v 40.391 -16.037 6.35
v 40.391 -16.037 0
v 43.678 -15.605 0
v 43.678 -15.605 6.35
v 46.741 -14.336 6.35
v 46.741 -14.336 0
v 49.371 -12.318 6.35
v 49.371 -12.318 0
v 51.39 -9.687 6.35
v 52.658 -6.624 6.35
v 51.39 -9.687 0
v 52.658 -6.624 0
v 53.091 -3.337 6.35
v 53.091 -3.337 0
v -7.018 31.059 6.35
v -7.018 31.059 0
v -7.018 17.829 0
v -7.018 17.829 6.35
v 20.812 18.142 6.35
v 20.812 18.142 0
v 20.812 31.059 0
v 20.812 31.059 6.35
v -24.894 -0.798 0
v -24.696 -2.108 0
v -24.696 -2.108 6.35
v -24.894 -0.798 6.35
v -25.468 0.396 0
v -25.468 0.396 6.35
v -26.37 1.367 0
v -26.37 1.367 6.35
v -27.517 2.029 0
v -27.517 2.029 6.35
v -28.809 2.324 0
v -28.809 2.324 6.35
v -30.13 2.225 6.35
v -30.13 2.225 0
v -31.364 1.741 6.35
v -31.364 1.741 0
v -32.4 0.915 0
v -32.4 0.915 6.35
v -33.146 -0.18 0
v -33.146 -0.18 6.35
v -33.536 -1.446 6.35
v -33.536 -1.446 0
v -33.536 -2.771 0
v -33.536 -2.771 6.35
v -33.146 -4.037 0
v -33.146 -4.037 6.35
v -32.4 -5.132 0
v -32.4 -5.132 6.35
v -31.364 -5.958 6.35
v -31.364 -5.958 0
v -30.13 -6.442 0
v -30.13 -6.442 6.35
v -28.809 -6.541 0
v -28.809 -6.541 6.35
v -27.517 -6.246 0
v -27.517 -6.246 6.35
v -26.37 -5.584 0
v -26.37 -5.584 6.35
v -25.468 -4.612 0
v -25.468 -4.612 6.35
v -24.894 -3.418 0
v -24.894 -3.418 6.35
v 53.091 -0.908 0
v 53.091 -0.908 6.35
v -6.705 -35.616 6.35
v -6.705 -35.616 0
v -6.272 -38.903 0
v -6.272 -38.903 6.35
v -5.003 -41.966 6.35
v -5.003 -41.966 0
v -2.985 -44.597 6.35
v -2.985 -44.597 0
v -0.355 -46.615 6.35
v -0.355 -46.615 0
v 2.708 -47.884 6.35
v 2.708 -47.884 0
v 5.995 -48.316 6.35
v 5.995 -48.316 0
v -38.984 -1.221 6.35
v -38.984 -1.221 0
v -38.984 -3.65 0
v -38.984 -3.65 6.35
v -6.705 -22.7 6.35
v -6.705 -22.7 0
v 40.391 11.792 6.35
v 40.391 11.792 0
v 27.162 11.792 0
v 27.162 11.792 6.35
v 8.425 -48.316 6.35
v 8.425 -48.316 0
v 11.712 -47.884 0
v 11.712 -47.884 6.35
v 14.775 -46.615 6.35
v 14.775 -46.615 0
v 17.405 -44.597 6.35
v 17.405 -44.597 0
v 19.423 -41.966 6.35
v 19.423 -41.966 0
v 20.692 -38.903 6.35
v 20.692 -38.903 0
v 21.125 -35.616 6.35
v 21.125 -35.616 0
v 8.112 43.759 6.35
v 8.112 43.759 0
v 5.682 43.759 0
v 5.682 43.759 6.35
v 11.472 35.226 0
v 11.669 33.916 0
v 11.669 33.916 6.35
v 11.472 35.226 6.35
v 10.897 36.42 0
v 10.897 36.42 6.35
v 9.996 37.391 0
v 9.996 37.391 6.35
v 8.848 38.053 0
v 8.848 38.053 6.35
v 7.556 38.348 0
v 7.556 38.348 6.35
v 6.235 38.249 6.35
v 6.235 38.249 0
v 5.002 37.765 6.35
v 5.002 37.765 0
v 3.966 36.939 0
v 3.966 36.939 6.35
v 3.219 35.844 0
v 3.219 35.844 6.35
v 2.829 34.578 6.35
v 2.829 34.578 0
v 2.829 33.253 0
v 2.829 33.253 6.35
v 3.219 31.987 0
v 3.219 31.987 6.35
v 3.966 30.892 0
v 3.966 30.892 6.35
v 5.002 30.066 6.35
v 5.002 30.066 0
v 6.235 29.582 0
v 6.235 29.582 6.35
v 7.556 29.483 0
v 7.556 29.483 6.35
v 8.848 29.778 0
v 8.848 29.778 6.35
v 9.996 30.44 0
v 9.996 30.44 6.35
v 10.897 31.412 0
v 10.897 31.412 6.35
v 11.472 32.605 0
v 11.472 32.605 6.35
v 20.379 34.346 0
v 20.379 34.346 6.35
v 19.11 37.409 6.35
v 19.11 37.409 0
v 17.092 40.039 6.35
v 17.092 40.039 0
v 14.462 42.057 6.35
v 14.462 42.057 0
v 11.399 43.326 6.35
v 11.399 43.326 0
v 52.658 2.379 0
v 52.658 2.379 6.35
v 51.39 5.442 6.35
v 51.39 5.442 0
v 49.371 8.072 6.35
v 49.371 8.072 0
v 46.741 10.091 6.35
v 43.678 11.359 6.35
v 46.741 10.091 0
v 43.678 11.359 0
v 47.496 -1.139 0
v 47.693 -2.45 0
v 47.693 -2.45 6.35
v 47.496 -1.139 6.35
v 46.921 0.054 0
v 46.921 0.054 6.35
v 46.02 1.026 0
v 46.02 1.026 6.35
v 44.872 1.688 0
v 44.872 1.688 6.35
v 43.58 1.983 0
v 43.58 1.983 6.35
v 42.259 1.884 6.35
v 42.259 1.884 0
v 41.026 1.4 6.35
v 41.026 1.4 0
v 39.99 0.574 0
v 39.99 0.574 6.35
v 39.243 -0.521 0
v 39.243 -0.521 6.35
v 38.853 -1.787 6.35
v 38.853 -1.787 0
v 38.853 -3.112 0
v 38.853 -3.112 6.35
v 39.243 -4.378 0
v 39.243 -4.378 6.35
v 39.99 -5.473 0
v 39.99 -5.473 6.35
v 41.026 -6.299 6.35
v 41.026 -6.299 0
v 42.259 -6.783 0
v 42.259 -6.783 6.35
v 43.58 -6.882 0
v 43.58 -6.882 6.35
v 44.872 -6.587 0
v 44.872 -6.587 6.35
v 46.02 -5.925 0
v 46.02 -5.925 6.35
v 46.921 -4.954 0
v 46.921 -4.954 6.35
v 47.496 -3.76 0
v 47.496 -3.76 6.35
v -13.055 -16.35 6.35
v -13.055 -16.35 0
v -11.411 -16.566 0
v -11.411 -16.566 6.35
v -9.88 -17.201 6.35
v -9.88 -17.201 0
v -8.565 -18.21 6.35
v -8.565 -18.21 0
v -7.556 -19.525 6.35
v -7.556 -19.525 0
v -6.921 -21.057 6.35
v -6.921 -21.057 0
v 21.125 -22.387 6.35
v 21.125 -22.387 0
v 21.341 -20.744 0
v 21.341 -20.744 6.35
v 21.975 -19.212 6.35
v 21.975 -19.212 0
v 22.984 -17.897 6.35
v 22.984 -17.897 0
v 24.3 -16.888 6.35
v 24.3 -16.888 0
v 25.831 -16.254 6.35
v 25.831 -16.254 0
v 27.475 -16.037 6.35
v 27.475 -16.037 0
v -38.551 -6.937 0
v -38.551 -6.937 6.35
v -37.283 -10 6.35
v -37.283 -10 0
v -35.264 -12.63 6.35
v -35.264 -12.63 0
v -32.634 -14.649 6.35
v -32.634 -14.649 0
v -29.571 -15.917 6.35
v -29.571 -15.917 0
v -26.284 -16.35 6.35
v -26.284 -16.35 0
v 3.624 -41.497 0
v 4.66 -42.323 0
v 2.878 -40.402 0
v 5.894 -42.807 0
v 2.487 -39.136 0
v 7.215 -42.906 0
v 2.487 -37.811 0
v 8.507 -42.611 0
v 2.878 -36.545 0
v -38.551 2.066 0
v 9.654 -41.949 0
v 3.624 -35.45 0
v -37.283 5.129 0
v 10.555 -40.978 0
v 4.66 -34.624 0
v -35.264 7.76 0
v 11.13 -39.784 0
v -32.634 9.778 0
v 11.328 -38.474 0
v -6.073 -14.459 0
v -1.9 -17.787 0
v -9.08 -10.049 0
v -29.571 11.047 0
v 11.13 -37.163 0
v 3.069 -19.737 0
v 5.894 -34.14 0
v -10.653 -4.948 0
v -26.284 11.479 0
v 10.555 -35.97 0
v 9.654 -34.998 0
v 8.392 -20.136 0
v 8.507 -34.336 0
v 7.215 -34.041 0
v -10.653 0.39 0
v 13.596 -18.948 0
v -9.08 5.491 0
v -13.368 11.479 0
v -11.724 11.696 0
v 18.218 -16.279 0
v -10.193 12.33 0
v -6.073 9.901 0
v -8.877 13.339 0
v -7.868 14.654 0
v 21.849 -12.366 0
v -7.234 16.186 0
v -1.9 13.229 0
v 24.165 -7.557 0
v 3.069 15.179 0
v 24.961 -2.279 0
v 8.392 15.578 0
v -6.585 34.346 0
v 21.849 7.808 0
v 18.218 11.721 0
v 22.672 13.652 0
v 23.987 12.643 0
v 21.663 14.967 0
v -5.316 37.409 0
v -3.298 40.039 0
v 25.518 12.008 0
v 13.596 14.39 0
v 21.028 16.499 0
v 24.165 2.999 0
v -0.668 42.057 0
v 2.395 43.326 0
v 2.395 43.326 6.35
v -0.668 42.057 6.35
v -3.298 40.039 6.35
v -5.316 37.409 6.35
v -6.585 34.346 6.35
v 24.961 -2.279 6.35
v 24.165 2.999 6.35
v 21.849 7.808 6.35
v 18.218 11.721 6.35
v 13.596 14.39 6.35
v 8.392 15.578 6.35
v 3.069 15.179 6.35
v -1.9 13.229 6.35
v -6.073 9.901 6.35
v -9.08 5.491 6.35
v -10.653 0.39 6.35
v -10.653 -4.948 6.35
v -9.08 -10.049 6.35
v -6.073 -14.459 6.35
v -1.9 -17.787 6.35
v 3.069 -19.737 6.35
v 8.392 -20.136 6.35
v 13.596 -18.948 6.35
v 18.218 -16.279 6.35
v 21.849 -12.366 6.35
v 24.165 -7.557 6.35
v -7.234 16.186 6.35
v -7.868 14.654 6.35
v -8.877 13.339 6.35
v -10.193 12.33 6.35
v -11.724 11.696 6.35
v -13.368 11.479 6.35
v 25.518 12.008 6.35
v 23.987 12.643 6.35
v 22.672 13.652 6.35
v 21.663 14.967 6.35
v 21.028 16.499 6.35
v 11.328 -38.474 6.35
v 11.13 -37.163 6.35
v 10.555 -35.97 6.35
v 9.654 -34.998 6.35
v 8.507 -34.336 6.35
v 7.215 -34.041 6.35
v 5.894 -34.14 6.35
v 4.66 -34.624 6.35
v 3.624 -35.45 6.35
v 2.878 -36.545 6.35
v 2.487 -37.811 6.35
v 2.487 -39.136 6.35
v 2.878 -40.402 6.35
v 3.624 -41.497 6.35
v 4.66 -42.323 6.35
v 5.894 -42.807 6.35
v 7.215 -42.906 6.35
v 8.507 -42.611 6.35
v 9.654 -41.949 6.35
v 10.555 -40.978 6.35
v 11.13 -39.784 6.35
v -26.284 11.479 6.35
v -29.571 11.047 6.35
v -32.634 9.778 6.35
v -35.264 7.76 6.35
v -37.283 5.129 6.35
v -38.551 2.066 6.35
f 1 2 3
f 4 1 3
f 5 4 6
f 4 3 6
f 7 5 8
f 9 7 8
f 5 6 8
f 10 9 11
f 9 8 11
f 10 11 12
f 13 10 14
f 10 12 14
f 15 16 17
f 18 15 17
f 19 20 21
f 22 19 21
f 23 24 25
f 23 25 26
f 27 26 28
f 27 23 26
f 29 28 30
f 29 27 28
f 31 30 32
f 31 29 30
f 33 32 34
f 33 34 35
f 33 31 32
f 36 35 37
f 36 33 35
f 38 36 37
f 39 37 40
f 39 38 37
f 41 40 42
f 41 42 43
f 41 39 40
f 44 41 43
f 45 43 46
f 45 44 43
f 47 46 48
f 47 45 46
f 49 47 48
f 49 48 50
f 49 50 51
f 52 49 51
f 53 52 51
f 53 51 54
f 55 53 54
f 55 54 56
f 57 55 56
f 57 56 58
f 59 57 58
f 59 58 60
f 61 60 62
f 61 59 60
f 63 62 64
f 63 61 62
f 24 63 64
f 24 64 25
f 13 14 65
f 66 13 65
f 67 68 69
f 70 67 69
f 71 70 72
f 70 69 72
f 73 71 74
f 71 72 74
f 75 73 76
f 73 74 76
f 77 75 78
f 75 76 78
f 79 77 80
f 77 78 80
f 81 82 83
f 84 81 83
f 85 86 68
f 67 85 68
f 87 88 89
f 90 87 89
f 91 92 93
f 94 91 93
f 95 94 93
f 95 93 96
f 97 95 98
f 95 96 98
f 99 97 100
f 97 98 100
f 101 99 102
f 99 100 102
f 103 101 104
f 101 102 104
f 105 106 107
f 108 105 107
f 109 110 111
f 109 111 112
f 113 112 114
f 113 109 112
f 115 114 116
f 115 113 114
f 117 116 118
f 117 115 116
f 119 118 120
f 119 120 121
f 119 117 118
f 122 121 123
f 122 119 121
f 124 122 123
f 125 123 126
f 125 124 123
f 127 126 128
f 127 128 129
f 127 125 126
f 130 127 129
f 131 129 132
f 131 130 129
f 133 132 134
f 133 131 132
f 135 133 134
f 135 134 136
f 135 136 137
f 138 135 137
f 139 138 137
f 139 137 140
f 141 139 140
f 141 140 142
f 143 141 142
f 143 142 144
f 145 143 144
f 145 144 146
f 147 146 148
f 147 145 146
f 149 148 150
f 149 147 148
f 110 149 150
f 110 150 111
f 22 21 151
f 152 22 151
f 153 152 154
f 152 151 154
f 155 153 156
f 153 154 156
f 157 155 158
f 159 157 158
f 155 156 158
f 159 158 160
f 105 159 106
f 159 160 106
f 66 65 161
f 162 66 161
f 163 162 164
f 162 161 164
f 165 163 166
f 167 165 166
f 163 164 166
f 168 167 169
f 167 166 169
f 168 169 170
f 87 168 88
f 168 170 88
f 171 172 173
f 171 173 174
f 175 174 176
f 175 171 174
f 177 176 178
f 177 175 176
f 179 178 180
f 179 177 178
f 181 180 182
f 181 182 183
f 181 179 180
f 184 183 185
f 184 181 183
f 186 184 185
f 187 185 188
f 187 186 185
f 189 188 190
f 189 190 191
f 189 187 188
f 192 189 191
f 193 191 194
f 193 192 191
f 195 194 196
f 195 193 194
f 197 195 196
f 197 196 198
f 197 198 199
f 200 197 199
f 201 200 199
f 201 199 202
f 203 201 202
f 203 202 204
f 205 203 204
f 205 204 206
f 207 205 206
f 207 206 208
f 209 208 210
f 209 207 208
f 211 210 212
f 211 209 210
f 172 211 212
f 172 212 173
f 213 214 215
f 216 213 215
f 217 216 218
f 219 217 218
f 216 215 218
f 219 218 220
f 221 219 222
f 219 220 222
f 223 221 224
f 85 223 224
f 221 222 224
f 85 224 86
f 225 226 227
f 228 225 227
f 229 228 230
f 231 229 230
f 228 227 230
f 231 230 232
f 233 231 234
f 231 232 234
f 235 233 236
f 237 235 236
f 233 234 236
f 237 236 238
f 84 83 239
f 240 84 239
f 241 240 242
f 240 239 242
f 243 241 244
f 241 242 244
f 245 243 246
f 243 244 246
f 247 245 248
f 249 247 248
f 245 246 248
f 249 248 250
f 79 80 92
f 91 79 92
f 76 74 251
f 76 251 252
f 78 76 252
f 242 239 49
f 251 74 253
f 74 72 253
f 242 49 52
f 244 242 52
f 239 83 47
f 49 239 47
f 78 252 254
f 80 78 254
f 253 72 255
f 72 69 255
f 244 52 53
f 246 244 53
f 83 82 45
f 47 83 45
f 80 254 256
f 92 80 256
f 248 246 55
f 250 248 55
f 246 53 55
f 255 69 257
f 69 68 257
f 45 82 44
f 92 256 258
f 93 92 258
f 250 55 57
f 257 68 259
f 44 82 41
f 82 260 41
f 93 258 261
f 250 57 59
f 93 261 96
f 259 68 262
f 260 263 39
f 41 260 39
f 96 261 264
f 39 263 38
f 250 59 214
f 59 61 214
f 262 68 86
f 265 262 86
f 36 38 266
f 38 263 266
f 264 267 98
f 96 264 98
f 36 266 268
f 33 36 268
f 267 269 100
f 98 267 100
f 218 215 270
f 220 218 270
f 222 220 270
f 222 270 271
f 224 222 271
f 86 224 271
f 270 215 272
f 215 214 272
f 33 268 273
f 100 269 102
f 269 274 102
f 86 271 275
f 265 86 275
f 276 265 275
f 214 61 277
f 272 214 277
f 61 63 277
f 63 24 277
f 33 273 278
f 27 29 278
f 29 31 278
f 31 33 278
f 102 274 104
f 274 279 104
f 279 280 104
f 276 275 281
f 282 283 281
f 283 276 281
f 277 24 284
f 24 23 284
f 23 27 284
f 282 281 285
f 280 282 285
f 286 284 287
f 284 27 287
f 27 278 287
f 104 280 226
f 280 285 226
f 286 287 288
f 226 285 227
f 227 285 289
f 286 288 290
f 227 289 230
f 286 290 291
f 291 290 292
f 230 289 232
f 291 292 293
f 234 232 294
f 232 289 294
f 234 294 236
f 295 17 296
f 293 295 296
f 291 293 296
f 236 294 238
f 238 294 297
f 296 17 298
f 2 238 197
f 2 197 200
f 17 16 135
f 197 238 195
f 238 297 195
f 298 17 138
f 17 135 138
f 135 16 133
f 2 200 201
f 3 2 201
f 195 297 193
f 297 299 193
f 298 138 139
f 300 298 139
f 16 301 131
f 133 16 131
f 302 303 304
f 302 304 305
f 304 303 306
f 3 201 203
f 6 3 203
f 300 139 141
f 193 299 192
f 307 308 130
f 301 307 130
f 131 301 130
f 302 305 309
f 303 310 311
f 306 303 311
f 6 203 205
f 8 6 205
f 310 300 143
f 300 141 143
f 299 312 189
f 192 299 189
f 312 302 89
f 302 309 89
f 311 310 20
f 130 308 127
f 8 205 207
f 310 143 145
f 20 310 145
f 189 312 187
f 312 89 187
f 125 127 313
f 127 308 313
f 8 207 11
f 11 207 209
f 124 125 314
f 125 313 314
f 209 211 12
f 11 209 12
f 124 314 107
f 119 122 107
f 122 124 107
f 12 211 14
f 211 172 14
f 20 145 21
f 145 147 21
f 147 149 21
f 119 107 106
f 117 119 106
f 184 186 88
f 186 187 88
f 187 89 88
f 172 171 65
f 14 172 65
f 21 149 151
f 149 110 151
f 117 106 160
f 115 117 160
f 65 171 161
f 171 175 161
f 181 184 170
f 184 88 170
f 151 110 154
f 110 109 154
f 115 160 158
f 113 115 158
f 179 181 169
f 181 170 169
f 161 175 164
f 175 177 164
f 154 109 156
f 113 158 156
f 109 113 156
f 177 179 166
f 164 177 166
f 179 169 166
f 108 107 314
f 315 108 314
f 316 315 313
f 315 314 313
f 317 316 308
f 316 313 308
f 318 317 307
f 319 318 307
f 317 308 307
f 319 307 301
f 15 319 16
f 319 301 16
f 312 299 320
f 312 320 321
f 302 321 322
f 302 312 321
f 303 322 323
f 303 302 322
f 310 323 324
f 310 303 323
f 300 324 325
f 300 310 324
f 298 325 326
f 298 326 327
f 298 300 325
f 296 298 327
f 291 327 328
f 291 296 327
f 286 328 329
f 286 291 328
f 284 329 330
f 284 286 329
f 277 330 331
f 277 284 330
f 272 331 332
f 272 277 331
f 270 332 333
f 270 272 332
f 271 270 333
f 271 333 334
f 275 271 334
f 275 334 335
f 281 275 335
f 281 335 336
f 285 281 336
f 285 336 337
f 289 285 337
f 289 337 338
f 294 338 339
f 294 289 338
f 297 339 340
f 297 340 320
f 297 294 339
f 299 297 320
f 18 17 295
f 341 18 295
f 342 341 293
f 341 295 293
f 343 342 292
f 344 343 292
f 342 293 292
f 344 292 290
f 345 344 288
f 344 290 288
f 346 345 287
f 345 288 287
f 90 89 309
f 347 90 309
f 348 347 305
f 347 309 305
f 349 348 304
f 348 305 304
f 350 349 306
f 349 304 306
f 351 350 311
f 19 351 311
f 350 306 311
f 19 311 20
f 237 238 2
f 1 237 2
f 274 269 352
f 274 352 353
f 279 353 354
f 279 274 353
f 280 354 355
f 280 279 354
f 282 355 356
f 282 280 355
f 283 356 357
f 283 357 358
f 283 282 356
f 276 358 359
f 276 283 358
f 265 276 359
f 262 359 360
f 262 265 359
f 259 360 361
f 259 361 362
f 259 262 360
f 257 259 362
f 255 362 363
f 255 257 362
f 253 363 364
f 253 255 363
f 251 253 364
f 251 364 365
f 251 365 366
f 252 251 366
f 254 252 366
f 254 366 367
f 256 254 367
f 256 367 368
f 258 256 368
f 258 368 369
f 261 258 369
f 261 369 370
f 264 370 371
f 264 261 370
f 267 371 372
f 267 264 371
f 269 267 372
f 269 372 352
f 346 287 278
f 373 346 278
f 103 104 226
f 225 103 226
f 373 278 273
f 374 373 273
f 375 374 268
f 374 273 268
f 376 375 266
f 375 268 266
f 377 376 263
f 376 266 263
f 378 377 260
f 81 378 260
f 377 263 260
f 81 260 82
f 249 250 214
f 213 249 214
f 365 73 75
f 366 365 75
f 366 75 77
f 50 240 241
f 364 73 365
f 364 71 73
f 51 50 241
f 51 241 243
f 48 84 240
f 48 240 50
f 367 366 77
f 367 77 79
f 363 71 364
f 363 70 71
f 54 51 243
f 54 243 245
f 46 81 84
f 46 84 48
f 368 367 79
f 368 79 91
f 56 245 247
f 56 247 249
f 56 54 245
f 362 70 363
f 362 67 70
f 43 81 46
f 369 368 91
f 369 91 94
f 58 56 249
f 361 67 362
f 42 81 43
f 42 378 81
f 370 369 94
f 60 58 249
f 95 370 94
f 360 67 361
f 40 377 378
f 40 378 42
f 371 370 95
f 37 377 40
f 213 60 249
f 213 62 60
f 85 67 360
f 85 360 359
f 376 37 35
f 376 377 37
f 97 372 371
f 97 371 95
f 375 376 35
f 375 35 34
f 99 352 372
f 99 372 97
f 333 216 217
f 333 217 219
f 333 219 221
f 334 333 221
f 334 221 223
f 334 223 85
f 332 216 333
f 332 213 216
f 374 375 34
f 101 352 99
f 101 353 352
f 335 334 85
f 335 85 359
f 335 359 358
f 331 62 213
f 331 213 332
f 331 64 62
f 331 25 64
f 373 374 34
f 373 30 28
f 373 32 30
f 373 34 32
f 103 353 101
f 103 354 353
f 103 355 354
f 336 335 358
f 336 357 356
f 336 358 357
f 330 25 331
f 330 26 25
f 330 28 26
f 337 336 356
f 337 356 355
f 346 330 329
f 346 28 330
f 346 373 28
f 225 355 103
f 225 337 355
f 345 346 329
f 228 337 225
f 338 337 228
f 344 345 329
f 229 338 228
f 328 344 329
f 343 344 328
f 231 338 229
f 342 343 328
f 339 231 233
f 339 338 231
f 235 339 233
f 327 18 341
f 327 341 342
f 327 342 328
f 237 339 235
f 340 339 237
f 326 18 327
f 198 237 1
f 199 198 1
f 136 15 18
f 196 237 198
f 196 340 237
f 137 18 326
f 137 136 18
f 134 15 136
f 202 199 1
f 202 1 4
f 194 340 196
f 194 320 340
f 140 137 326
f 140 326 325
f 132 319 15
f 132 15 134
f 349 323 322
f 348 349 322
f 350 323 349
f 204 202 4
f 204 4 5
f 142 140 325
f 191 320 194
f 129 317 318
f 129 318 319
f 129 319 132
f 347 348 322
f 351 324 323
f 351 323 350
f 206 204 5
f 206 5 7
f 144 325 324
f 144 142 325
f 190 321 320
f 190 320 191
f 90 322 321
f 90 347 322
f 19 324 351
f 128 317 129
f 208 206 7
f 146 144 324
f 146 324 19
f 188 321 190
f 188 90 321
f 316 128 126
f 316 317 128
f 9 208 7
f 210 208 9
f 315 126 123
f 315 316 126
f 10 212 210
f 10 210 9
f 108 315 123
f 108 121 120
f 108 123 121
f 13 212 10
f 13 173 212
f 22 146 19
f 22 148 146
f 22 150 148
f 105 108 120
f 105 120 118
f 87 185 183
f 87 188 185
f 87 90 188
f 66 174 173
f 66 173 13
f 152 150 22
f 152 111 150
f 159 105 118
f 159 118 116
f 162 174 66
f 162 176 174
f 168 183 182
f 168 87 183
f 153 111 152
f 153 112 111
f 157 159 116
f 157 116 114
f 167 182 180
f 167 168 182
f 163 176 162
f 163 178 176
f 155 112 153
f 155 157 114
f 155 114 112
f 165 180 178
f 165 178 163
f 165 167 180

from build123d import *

# Parameters (mm, degrees)
F0_R     = 4.445
F0_R_2   = 17.907
F1_DEPTH = 6.35


with BuildPart() as f1:
    # F0 (on Top) → F1 (new body)
    with BuildSketch(Plane.XY):
        with BuildLine():
            Line((40.391009, 11.792125), (27.161882, 11.792125))
            ThreePointArc((27.161882, 11.792125), (22.671754, 13.651997), (20.811882, 18.142125))
            Line((20.811882, 18.142125), (20.811882, 31.058542))
            ThreePointArc((20.811882, 31.058542), (17.092138, 40.038798), (8.111882, 43.758542))
            Line((8.111882, 43.758542), (5.682427, 43.758542))
            ThreePointArc((5.682427, 43.758542), (-3.297829, 40.038798), (-7.017573, 31.058542))
            Line((-7.017573, 31.058542), (-7.017573, 17.829415))
            ThreePointArc((-7.017573, 17.829415), (-8.877445, 13.339287), (-13.367573, 11.479415))
            Line((-13.367573, 11.479415), (-26.283991, 11.479415))
            ThreePointArc((-26.283991, 11.479415), (-35.264247, 7.759671), (-38.983991, -1.220585))
            Line((-38.983991, -1.220585), (-38.983991, -3.65004))
            ThreePointArc((-38.983991, -3.65004), (-35.264247, -12.630296), (-26.283991, -16.35004))
            Line((-26.283991, -16.35004), (-13.054863, -16.35004))
            ThreePointArc((-13.054863, -16.35004), (-8.564735, -18.209912), (-6.704863, -22.70004))
            Line((-6.704863, -22.70004), (-6.704863, -35.616458))
            ThreePointArc((-6.704863, -35.616458), (-2.985119, -44.596714), (5.995137, -48.316458))
            Line((5.995137, -48.316458), (8.424592, -48.316458))
            ThreePointArc((8.424592, -48.316458), (17.404848, -44.596714), (21.124592, -35.616458))
            Line((21.124592, -35.616458), (21.124592, -22.38733))
            ThreePointArc((21.124592, -22.38733), (22.984464, -17.897202), (27.474592, -16.03733))
            Line((27.474592, -16.03733), (40.391009, -16.03733))
            ThreePointArc((40.391009, -16.03733), (49.371265, -12.317586), (53.091009, -3.33733))
            Line((53.091009, -3.33733), (53.091009, -0.907875))
            ThreePointArc((53.091009, -0.907875), (49.371265, 8.072381), (40.391009, 11.792125))
        make_face()
        with Locations((6.882834, -38.473555)):
            Circle(F0_R, mode=Mode.SUBTRACT)
        with Locations((43.248107, -2.449633)):
            Circle(F0_R, mode=Mode.SUBTRACT)
        with Locations((-29.141088, -2.108283)):
            Circle(F0_R, mode=Mode.SUBTRACT)
        with Locations((7.053509, -2.278958)):
            Circle(F0_R_2, mode=Mode.SUBTRACT)
        with Locations((7.224184, 33.91564)):
            Circle(F0_R, mode=Mode.SUBTRACT)
    extrude(amount=F1_DEPTH)


solid = f1.part
